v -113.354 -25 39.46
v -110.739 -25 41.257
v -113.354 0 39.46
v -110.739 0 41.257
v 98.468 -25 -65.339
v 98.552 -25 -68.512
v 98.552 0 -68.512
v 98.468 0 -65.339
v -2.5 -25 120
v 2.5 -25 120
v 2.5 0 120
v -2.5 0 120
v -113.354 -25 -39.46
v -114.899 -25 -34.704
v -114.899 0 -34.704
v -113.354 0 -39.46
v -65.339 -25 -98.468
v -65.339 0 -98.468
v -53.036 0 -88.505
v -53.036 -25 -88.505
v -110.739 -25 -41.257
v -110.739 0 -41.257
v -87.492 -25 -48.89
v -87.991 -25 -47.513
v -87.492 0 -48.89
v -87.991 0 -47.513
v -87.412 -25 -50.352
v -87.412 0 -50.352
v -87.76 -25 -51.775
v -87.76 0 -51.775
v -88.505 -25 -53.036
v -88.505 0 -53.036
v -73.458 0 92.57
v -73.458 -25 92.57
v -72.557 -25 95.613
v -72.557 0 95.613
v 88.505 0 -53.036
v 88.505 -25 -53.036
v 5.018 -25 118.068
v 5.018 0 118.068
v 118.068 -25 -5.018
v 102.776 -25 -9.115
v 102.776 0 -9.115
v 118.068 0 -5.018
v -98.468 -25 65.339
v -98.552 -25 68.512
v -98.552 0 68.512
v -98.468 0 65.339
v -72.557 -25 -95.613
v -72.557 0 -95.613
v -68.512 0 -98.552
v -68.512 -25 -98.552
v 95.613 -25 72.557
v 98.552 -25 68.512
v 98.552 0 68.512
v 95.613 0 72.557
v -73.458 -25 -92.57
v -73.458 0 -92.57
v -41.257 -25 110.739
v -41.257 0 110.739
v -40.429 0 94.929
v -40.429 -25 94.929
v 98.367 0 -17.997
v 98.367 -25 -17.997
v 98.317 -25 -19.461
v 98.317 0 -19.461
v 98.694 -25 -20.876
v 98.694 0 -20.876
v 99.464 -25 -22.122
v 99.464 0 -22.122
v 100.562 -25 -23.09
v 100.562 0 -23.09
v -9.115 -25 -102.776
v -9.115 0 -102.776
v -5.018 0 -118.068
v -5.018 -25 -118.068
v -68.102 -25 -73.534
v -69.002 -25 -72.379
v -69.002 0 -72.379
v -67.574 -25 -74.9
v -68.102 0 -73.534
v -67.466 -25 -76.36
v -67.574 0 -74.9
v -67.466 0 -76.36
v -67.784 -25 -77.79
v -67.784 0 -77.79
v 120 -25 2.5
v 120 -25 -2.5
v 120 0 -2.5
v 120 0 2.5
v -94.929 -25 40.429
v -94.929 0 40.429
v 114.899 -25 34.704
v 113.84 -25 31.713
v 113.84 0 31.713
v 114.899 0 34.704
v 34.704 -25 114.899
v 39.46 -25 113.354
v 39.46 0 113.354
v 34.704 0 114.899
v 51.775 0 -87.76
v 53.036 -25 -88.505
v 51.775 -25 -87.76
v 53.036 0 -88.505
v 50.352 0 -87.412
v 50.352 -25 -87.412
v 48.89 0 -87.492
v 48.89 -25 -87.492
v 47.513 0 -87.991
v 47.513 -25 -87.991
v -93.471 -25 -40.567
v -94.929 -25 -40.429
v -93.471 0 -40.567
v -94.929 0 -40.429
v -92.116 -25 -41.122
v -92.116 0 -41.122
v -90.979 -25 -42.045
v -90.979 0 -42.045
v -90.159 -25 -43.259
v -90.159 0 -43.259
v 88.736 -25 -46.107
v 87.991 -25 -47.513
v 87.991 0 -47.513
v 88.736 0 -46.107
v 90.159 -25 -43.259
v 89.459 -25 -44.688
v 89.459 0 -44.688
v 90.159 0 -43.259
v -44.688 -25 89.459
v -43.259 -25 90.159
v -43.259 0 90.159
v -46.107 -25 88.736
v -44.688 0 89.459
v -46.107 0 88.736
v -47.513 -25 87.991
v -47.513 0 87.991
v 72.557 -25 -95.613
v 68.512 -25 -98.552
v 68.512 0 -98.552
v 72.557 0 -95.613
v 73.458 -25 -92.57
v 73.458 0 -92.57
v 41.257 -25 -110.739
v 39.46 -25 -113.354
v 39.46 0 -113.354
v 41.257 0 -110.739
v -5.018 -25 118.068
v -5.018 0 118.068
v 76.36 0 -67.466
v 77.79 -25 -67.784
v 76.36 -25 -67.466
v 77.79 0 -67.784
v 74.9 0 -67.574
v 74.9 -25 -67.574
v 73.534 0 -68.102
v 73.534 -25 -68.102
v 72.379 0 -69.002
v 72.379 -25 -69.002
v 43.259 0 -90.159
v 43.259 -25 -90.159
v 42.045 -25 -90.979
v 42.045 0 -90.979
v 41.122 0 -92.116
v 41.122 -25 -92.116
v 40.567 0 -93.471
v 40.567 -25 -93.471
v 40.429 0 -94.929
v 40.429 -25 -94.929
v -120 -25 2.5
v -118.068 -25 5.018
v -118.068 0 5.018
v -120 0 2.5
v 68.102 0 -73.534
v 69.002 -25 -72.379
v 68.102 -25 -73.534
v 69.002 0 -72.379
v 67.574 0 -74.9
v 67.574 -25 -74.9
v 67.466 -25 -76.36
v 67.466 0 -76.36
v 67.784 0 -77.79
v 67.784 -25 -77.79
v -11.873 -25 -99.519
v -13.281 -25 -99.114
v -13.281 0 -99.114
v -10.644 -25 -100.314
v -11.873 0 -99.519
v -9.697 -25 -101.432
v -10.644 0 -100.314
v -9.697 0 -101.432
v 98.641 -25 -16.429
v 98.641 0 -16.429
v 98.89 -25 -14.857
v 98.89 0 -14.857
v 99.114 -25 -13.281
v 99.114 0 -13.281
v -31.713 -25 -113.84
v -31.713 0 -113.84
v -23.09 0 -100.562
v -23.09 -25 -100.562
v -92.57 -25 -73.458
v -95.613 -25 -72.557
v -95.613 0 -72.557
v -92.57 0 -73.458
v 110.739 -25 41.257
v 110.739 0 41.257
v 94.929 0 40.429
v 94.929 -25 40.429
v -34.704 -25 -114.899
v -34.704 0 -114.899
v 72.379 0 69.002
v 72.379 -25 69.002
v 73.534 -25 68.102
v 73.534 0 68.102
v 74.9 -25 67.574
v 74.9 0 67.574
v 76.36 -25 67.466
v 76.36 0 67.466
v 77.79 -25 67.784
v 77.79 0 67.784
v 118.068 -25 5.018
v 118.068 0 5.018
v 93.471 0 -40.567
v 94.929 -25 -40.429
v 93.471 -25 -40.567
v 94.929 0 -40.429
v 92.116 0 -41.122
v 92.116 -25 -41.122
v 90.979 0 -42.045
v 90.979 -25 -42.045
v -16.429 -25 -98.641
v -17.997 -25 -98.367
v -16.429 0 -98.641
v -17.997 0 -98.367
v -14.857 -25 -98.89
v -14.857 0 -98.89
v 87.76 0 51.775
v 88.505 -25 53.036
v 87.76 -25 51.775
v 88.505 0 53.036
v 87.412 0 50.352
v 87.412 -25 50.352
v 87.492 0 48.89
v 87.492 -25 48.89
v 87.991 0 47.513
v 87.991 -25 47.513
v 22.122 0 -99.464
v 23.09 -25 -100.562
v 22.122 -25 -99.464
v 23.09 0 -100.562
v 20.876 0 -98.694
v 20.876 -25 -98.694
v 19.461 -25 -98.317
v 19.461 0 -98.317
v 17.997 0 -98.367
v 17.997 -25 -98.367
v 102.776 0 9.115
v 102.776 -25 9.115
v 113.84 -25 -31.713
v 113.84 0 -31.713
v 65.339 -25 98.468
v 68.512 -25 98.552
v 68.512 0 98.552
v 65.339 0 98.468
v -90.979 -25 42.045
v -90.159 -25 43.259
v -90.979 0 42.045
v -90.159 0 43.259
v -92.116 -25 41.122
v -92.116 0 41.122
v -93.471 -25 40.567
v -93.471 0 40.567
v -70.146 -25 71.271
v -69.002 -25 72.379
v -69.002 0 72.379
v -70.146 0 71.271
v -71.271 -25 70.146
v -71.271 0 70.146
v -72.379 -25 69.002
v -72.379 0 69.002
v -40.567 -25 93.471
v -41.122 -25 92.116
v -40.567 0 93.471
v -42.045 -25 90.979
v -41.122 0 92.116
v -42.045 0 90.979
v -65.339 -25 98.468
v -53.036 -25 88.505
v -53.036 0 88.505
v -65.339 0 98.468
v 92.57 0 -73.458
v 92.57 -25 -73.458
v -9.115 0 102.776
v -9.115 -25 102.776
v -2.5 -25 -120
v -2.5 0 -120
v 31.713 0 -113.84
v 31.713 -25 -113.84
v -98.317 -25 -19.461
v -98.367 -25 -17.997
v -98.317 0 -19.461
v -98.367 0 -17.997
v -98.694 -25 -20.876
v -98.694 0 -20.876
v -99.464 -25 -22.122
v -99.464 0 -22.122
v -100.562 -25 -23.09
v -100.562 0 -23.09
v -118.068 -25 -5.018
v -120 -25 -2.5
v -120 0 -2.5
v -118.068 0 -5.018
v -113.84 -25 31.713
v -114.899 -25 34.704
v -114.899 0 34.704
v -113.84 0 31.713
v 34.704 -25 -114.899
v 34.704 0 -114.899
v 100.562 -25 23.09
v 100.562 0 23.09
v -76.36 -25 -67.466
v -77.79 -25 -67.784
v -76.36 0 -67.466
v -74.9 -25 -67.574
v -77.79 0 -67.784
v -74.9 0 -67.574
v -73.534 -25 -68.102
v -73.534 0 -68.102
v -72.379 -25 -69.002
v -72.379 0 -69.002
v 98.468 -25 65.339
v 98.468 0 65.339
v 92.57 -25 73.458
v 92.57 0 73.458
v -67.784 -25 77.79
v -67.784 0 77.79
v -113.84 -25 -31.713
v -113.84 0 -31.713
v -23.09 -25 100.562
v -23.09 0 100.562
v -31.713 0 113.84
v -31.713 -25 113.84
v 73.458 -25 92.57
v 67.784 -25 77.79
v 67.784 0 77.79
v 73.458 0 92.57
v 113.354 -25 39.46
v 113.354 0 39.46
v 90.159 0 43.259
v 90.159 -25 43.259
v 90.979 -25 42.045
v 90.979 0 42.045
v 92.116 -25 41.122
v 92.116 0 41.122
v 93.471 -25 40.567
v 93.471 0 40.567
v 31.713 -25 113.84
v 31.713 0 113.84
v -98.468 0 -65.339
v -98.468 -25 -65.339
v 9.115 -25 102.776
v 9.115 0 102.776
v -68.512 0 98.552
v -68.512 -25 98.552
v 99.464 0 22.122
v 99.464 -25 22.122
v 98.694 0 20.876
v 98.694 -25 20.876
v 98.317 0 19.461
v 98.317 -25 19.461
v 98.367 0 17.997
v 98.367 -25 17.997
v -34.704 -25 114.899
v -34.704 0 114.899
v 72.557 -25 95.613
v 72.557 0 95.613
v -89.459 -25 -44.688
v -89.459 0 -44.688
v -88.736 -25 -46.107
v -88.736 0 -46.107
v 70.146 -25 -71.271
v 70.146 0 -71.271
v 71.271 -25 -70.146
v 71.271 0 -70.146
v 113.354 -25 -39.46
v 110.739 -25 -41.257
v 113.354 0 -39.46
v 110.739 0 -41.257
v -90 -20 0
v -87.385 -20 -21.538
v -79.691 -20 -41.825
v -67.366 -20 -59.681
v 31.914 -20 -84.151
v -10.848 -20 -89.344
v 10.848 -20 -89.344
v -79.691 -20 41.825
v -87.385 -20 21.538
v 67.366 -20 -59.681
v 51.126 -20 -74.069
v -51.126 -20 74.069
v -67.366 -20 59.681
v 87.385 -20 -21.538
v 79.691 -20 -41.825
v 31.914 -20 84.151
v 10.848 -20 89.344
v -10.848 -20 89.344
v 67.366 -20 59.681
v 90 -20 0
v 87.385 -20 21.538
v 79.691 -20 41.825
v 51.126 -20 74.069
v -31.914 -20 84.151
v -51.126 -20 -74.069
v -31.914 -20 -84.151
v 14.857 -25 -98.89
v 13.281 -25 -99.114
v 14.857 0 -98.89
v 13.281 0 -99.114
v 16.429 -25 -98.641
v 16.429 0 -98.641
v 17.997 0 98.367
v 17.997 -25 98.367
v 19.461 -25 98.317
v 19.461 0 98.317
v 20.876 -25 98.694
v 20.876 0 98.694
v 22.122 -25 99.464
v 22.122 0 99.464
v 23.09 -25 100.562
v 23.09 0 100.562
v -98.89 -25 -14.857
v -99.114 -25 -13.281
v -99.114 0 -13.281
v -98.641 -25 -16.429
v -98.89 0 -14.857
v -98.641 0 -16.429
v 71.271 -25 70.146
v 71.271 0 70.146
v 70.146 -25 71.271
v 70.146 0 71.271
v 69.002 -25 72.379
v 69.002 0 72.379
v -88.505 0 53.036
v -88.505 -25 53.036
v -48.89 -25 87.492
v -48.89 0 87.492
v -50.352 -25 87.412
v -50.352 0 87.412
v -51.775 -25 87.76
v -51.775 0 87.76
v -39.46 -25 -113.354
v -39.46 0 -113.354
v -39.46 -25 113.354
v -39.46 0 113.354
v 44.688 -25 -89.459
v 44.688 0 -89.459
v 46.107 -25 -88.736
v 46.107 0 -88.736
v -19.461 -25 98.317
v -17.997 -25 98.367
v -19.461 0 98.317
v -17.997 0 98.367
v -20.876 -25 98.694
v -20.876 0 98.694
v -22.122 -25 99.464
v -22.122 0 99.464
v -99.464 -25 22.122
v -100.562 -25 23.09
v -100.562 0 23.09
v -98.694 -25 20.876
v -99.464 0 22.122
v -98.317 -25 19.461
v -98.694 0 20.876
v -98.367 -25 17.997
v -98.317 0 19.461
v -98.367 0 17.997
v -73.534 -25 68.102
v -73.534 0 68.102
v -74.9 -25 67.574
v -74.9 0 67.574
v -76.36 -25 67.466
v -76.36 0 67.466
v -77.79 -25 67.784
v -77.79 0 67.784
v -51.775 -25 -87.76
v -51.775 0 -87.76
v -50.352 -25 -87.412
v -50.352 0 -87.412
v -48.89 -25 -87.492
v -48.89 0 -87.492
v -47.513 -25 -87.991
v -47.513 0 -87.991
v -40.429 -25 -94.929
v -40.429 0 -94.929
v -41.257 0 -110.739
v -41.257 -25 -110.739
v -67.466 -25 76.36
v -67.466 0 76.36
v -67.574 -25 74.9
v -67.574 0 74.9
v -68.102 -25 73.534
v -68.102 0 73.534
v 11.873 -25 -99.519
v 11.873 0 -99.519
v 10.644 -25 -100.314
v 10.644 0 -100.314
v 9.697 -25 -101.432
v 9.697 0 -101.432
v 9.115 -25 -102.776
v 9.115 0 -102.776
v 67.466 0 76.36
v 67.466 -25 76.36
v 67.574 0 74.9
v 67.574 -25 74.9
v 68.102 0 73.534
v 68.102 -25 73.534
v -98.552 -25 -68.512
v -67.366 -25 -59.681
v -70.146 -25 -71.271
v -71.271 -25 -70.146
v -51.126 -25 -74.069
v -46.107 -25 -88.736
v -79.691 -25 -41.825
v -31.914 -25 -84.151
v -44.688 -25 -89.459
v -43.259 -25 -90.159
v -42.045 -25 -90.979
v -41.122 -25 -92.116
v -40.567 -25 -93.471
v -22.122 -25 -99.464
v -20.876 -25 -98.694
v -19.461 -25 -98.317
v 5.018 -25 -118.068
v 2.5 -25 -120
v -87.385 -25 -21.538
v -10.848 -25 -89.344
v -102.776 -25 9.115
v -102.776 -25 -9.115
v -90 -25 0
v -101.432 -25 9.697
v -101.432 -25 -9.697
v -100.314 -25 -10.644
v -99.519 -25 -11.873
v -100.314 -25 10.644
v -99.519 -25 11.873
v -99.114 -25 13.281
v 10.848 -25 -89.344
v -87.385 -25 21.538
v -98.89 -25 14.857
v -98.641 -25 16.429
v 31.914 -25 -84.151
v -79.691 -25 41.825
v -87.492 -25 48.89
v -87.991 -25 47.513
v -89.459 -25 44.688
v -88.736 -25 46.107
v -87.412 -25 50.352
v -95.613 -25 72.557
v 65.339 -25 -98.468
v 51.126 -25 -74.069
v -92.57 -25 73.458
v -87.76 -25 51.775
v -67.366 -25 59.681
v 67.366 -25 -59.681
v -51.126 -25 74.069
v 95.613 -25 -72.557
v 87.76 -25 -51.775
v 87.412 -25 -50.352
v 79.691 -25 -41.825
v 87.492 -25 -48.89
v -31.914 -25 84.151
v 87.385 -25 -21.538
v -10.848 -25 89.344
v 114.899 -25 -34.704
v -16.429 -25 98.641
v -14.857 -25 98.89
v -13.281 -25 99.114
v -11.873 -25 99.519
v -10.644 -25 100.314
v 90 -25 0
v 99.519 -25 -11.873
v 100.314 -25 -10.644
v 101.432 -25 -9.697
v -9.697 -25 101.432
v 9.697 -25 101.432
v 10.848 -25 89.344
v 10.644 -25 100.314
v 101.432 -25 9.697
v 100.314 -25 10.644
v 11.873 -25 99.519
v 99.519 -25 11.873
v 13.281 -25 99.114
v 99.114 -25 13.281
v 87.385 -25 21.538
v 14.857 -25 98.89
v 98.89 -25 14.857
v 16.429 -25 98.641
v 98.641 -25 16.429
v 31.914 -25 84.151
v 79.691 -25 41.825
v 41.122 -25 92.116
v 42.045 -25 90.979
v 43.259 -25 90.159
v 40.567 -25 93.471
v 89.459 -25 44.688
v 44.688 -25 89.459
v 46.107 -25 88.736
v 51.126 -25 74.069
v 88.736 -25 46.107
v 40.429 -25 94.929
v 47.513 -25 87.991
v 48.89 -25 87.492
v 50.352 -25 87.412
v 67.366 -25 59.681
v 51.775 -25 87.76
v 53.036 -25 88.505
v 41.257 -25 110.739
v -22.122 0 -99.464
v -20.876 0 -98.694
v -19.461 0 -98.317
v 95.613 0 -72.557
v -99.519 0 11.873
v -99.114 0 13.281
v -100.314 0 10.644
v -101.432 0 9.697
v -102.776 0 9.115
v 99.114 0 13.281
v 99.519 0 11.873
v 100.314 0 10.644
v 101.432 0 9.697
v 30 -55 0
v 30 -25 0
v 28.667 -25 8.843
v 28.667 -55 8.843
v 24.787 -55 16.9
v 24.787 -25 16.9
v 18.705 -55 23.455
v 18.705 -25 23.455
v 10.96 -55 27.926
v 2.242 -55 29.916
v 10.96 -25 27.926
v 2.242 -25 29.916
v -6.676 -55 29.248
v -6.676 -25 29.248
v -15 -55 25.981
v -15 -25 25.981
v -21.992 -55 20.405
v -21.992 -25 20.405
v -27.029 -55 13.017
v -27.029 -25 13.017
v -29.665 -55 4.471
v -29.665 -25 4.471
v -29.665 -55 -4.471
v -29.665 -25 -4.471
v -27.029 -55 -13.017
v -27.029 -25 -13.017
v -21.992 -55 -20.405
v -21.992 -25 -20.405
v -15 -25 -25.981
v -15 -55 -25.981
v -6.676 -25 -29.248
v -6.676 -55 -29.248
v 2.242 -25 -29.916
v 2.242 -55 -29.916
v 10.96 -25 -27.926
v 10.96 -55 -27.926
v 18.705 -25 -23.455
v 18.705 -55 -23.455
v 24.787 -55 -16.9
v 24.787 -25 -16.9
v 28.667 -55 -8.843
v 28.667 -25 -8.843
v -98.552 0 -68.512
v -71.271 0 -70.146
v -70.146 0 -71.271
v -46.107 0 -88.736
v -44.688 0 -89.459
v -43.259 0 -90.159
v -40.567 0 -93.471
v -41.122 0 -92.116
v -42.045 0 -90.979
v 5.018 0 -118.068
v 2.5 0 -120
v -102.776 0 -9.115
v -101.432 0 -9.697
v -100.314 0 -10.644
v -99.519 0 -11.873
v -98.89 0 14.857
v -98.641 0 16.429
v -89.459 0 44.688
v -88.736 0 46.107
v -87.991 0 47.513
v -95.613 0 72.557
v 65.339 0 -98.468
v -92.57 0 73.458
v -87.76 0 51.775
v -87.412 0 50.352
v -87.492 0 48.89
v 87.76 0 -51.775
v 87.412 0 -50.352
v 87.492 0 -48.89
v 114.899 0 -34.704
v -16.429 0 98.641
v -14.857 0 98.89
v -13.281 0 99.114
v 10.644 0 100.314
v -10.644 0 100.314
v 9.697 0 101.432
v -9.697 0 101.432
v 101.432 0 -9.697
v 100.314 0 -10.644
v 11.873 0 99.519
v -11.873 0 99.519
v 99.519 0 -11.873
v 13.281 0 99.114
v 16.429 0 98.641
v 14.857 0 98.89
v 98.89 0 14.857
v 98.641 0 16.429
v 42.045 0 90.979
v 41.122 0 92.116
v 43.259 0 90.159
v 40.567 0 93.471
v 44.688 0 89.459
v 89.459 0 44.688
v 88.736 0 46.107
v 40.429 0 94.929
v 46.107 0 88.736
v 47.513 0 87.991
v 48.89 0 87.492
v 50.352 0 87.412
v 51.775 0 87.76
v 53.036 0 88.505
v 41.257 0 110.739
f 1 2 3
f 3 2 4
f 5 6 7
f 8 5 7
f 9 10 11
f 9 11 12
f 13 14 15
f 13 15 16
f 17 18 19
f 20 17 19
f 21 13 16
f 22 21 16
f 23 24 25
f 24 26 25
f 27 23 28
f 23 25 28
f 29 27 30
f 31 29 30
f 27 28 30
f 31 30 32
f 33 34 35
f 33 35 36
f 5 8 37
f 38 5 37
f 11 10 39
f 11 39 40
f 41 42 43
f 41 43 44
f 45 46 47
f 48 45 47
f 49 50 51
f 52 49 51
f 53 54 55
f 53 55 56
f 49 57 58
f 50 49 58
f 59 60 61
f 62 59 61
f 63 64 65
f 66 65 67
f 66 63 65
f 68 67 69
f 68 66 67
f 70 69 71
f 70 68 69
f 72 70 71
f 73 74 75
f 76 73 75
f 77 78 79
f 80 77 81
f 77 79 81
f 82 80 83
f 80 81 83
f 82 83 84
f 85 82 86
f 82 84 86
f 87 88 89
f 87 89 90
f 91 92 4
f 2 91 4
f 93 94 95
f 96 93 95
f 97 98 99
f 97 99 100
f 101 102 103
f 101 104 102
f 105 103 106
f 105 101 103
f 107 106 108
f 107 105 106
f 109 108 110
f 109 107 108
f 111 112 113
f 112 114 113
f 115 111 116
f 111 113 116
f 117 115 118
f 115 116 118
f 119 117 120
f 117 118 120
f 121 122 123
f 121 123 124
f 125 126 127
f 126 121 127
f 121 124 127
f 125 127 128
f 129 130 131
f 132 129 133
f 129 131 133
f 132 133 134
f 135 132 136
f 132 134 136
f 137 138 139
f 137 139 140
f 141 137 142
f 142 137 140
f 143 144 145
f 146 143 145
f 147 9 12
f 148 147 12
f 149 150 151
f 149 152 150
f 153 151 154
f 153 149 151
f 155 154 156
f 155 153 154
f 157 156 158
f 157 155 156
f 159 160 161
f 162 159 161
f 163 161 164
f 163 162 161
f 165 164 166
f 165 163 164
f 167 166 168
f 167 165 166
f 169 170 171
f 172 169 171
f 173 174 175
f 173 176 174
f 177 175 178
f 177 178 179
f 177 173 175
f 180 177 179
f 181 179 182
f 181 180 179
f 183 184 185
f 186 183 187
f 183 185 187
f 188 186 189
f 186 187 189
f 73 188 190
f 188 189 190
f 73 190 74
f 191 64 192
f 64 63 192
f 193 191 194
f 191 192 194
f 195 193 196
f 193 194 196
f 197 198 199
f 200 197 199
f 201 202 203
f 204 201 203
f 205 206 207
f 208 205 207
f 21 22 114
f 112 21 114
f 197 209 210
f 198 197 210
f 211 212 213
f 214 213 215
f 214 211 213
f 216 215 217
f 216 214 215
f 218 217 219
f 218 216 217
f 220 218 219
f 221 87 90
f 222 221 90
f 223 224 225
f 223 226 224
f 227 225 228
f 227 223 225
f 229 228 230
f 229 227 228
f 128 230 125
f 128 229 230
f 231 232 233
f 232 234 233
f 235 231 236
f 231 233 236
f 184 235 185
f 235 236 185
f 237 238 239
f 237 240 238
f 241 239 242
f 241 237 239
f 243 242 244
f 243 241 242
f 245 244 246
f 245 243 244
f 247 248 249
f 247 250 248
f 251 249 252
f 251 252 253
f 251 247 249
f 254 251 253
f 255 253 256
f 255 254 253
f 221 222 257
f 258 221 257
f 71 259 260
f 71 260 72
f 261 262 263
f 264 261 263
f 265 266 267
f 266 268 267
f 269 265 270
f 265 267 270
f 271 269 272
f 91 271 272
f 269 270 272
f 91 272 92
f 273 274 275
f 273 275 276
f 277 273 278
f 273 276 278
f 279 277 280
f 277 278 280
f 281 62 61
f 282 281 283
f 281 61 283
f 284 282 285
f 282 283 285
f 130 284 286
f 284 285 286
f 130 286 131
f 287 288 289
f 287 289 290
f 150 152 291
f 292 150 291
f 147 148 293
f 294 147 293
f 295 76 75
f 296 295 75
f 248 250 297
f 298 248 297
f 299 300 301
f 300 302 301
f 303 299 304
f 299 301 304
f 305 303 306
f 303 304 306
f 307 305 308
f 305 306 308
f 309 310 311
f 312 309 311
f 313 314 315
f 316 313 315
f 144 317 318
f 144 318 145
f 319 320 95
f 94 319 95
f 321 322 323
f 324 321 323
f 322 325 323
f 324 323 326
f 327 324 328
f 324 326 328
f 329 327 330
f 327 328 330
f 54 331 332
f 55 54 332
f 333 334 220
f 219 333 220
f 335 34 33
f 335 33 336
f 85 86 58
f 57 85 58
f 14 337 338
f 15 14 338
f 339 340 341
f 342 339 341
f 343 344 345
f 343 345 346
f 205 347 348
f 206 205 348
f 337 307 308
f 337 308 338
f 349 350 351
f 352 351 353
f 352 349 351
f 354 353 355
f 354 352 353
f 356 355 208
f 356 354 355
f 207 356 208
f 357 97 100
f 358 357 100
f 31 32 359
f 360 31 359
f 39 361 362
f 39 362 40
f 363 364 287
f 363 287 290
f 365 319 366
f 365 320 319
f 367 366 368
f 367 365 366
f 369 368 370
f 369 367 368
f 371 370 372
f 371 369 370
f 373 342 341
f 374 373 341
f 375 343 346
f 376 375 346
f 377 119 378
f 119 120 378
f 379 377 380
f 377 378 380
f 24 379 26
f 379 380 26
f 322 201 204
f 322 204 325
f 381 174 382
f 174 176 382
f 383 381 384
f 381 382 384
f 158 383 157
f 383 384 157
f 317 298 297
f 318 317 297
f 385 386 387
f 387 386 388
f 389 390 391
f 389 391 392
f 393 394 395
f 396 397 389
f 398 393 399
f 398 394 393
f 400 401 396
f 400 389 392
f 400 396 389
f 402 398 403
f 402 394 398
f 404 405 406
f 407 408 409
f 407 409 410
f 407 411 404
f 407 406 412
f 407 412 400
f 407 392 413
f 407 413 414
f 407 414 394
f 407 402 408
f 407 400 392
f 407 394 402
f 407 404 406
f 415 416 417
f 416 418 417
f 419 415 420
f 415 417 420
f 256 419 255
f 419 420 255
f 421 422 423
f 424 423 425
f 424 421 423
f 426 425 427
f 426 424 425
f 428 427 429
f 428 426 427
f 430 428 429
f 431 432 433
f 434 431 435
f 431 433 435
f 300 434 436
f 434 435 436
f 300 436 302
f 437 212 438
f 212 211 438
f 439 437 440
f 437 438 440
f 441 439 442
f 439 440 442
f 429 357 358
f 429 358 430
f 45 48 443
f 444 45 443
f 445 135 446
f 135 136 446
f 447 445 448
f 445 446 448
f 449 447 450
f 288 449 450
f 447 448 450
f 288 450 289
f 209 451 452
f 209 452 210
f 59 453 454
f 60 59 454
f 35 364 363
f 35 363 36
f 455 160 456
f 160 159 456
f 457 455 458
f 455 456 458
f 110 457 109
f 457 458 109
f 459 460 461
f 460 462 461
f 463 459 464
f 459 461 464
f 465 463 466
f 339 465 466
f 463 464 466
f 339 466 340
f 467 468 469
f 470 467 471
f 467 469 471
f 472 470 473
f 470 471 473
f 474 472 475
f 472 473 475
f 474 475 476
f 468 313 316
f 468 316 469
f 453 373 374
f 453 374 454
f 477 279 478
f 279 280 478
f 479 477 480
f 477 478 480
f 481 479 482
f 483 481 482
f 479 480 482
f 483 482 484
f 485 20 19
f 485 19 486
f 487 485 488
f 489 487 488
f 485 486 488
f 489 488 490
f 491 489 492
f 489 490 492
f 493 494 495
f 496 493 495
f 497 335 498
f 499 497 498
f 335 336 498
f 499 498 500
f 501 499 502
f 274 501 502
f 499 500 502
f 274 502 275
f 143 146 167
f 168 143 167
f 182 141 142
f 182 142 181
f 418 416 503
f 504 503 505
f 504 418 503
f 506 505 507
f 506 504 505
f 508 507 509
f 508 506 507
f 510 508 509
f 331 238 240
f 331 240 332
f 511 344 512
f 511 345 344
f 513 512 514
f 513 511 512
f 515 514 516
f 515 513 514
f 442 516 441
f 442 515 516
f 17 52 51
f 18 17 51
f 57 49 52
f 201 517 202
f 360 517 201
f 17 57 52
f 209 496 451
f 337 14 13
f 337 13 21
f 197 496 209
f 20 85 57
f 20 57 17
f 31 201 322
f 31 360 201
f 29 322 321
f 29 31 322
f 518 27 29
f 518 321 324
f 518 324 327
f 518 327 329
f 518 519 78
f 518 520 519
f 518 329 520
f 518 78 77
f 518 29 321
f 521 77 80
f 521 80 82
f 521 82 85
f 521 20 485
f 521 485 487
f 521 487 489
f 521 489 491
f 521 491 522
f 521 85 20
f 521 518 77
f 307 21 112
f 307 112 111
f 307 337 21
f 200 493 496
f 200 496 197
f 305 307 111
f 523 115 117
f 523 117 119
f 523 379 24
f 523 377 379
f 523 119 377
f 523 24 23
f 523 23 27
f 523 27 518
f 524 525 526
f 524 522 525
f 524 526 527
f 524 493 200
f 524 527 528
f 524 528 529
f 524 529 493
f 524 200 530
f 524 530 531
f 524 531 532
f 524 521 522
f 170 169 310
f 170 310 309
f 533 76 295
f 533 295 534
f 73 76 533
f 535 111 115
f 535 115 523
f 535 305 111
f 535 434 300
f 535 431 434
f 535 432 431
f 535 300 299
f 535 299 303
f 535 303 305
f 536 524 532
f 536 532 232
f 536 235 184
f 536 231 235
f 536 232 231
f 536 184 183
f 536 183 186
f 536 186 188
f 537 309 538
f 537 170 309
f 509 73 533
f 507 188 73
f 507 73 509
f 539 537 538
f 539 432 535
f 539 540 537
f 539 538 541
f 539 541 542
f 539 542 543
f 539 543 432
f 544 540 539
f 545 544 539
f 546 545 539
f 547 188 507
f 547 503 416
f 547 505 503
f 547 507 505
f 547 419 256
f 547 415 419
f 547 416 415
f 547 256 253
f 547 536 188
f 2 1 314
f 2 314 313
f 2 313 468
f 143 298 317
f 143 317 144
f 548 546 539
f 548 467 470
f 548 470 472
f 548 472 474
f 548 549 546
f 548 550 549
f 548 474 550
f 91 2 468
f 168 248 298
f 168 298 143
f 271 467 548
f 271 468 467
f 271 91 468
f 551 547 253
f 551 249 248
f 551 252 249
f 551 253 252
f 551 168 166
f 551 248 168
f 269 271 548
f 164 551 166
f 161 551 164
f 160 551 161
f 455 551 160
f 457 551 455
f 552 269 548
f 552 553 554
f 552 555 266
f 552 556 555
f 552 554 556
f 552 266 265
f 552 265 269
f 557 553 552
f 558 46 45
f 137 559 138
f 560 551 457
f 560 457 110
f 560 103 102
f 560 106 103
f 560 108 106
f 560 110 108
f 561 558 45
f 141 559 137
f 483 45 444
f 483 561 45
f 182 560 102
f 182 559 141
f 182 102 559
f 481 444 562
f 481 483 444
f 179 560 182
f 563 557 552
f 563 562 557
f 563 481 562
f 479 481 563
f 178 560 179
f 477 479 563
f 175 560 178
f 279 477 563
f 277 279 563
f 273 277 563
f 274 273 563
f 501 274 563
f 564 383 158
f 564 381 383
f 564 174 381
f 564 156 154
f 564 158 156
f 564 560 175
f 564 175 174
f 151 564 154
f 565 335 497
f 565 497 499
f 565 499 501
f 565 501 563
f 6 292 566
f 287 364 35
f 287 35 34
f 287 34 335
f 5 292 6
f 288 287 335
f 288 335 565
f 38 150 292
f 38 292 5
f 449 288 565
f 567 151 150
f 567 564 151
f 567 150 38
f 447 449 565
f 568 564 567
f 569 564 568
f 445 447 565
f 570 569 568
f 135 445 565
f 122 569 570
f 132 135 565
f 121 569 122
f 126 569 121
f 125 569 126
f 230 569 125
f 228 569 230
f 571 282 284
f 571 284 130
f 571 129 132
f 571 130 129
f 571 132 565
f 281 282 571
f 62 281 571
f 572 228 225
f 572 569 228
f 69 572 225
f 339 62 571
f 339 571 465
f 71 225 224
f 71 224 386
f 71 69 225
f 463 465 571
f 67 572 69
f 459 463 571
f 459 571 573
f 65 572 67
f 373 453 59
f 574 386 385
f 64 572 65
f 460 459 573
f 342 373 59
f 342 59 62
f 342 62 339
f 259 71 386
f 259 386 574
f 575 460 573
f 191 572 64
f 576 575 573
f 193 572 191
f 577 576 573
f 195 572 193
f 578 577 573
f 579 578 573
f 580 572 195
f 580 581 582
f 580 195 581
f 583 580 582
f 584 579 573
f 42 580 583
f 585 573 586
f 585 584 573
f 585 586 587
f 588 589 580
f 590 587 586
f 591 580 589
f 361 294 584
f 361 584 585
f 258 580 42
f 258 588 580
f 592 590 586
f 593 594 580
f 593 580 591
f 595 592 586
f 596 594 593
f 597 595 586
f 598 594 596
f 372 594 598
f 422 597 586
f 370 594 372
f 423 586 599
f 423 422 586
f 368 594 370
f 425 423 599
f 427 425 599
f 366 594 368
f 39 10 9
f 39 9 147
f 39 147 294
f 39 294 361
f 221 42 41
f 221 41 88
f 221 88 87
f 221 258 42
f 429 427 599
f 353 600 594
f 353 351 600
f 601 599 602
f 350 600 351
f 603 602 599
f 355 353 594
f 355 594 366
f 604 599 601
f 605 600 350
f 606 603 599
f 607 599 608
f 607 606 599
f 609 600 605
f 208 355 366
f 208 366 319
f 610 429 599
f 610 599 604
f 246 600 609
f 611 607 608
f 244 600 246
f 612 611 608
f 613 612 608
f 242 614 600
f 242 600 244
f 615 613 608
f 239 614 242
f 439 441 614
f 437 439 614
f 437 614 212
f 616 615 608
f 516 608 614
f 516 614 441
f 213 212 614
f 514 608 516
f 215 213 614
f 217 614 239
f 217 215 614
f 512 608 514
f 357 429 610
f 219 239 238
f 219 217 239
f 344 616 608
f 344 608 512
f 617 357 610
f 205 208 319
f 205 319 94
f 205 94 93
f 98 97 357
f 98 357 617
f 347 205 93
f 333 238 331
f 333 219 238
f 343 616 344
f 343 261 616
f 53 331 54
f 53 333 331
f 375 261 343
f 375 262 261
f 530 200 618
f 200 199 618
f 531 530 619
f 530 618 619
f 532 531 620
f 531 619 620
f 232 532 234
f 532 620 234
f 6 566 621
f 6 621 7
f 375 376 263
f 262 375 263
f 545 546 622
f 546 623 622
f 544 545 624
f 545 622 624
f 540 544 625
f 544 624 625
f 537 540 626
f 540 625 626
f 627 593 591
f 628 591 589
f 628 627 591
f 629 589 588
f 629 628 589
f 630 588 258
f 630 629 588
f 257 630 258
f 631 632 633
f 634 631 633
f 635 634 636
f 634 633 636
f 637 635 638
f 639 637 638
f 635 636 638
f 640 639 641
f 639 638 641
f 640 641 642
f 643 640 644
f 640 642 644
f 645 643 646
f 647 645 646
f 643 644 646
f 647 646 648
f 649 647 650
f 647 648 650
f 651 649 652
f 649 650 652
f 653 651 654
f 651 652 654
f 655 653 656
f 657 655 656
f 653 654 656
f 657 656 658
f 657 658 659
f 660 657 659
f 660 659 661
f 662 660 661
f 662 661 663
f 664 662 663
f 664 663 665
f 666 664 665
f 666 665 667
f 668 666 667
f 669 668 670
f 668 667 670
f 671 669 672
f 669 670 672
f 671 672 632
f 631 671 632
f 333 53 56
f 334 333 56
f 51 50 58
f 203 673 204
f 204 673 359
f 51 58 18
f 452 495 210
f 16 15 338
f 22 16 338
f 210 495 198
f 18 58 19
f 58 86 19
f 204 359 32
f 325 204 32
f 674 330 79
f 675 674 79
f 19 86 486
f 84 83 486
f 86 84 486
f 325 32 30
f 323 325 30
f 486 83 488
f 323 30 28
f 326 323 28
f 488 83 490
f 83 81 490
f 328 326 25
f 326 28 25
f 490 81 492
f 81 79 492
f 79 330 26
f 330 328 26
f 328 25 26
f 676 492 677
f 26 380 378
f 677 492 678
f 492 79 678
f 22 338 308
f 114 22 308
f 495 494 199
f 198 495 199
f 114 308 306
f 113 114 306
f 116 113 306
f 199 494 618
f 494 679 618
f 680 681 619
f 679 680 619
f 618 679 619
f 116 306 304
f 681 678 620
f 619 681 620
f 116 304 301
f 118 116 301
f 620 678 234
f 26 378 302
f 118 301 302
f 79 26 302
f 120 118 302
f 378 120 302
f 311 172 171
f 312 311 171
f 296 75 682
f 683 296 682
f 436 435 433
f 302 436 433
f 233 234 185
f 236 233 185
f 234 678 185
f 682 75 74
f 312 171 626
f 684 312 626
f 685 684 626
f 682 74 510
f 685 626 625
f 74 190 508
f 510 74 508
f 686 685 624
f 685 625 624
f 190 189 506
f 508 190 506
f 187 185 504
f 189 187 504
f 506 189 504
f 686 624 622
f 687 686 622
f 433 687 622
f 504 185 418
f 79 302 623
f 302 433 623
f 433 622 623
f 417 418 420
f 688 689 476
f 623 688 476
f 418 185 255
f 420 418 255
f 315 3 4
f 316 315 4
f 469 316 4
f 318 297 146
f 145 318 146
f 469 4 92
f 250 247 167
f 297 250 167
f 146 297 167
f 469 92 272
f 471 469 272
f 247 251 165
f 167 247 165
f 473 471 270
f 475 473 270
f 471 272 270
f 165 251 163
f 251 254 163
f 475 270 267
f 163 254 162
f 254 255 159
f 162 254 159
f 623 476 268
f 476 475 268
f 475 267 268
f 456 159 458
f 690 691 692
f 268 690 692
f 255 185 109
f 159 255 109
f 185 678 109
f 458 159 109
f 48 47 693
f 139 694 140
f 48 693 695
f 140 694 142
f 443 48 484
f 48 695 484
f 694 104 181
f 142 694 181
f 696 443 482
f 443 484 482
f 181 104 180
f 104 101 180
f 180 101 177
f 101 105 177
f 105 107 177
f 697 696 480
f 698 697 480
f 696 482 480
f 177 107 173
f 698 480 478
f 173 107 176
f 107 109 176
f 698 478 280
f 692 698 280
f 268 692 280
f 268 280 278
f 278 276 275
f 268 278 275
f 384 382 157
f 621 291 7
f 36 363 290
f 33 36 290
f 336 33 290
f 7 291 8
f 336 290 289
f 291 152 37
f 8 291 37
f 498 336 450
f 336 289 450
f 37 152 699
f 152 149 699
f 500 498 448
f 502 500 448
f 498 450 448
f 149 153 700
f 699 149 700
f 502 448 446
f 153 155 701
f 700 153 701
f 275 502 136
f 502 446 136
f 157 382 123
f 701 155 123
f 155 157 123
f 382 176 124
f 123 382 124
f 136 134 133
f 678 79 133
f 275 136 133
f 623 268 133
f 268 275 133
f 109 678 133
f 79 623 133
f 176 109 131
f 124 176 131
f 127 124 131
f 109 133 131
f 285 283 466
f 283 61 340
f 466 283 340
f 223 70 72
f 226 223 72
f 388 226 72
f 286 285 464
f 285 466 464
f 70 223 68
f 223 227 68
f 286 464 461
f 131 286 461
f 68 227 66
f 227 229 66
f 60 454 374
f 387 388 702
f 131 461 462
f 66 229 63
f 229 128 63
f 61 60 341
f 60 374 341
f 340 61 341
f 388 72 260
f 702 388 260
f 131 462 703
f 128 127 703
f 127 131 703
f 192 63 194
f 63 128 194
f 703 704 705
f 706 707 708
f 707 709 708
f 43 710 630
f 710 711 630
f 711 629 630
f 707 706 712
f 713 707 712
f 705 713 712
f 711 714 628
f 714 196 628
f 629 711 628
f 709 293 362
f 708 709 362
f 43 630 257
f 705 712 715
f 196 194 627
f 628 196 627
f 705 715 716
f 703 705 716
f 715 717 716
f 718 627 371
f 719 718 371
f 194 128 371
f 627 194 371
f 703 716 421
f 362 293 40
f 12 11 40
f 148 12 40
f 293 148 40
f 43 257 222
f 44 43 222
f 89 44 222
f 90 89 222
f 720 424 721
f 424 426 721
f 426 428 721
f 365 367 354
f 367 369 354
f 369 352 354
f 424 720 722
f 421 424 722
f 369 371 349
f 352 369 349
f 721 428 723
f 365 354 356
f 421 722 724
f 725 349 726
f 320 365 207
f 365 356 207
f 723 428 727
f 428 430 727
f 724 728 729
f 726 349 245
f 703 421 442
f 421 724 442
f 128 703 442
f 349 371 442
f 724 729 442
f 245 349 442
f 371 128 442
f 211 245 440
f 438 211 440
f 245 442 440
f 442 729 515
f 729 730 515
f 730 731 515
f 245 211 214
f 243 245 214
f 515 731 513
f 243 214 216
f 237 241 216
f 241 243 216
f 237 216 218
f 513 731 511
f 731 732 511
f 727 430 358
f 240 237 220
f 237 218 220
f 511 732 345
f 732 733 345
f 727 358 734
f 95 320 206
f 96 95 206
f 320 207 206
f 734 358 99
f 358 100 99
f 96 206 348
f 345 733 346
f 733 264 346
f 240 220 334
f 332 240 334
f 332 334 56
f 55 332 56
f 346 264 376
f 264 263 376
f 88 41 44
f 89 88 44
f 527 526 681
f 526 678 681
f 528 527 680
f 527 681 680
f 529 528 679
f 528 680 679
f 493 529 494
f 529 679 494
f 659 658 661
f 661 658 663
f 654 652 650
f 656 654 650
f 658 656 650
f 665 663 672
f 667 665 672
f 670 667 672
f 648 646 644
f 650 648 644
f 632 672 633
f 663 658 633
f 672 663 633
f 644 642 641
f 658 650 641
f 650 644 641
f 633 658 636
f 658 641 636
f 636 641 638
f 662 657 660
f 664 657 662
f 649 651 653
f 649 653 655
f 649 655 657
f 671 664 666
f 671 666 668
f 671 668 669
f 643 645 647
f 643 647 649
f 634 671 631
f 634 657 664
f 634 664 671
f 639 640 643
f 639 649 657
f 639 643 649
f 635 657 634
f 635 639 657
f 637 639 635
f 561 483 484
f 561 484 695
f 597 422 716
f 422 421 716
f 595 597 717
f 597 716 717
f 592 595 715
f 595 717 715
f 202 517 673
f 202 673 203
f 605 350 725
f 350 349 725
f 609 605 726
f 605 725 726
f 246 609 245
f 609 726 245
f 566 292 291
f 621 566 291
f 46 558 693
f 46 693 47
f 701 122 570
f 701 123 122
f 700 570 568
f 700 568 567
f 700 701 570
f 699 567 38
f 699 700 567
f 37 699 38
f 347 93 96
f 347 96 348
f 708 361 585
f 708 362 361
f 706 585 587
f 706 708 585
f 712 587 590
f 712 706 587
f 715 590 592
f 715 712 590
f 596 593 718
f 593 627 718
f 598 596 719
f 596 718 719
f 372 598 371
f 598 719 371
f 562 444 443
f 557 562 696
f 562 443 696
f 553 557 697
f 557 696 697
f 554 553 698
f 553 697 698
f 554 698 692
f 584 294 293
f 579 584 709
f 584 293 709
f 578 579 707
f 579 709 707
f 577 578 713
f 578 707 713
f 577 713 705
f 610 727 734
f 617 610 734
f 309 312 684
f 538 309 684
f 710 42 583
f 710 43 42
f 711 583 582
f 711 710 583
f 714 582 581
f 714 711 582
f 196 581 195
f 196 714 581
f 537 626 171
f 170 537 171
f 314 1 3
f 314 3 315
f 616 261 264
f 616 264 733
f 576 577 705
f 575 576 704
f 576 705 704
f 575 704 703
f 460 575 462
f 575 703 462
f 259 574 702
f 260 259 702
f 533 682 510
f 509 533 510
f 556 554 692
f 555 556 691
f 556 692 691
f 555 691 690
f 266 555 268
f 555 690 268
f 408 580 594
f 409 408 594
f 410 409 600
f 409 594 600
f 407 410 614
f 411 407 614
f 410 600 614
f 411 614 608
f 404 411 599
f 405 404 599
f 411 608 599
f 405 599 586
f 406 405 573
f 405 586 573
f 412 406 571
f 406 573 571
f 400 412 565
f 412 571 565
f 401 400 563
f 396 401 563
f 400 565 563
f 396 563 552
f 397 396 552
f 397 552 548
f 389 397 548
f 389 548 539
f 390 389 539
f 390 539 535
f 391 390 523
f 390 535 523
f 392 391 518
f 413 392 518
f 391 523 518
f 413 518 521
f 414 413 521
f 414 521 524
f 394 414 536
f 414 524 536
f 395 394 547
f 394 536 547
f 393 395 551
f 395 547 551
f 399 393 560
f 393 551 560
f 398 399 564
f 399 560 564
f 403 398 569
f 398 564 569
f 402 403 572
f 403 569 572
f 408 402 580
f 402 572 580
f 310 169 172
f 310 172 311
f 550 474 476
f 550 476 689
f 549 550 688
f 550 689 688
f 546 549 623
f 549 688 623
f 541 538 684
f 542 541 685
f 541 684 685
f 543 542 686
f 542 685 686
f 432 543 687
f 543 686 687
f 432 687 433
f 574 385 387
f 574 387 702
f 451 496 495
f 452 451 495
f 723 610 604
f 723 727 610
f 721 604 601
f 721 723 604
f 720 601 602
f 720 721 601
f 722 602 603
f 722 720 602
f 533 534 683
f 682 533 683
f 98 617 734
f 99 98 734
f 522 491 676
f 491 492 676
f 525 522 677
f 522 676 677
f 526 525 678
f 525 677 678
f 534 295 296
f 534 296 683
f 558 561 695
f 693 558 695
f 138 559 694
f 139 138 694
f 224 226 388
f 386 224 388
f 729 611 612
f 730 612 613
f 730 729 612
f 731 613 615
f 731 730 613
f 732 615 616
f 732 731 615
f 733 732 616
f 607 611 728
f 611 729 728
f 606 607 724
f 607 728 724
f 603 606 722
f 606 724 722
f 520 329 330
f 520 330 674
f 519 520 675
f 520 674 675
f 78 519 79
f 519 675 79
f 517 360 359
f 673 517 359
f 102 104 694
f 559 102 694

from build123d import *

# Parameters (mm, degrees)
F0_R            = 100
F1_DEPTH        = 25
F3_DEPTH        = 25
F3_COPIES_COUNT = 20
F4_SIZE         = 2
F5_R            = 5
F6_R            = 90
F7_DEPTH        = 5
F8_R            = 30
F9_DEPTH        = 30


# Not quite as in the source:
# - a pattern or mirror of a feature is missing from the dataset's text; its kind, count and spacing are read off the source's solid


with BuildPart() as f1:
    # F0 (on Front) → F1 (new body)
    with BuildSketch(Plane.XZ):
        Circle(F0_R)
    extrude(amount=F1_DEPTH)

    # F2 (on face) → F3 (join)
    with BuildSketch(Plane.XZ.offset(25)):
        with BuildLine():
            Line((9.9931095726, 99.4994359837), (-9.9931095726, 99.4994359837))
            ThreePointArc((-9.9931095726, 99.4994359837), (-67.0846071865, -74.159662072), (100, 0))
            ThreePointArc((100, 0), (74.159662072, 67.0846071865), (9.9931095726, 99.4994359837))
        make_face()
        with BuildLine():
            Line((-4.5, 120), (-9.9931095726, 99.4994359837))
            ThreePointArc((-9.9931095726, 99.4994359837), (0, 100), (9.9931095726, 99.4994359837))
            Line((9.9931095726, 99.4994359837), (4.5, 120))
            Line((4.5, 120), (-4.5, 120))
        make_face()
    f3 = extrude(amount=-F3_DEPTH)

    # F3_copies: F3 ×20 about axis
    f3_copies_axis = Axis((0, 0, 0), (0, 1, 0))
    for i in range(1, F3_COPIES_COUNT):
        add(f3.rotate(f3_copies_axis, i * 360 / F3_COPIES_COUNT))

    # F4
    f4_edges = [f1.edges().sort_by_distance(p)[0] for p in [
        (-4.5, -12.5, 120),
        (4.5, -12.5, 120),
        (-41.361794, -12.5, 112.736205),
        (-66.893654, -12.5, 99.727073),
        (-32.802285, -12.5, 115.517358),
        (-74.174807, -12.5, 94.437006),
        (32.802285, -12.5, 115.517358),
        (41.361794, -12.5, 112.736205),
        (66.893654, -12.5, 99.727073),
        (74.174807, -12.5, 94.437006),
        (94.437006, -12.5, 74.174807),
        (99.727073, -12.5, 66.893654),
        (112.736205, -12.5, 41.361794),
        (115.517358, -12.5, 32.802285),
        (120, -12.5, 4.5),
        (120, -12.5, -4.5),
        (115.517358, -12.5, -32.802285),
        (112.736205, -12.5, -41.361794),
        (99.727073, -12.5, -66.893654),
        (94.437006, -12.5, -74.174807),
        (74.174807, -12.5, -94.437006),
        (66.893654, -12.5, -99.727073),
        (41.361794, -12.5, -112.736205),
        (32.802285, -12.5, -115.517358),
        (4.5, -12.5, -120),
        (-4.5, -12.5, -120),
        (-32.802285, -12.5, -115.517358),
        (-41.361794, -12.5, -112.736205),
        (-66.893654, -12.5, -99.727073),
        (-74.174807, -12.5, -94.437006),
        (-94.437006, -12.5, -74.174807),
        (-99.727073, -12.5, -66.893654),
        (-112.736205, -12.5, -41.361794),
        (-115.517358, -12.5, -32.802285),
        (-120, -12.5, -4.5),
        (-120, -12.5, 4.5),
        (-115.517358, -12.5, 32.802285),
        (-112.736205, -12.5, 41.361794),
        (-99.727073, -12.5, 66.893654),
        (-94.437006, -12.5, 74.174807),
    ]]
    chamfer(f4_edges, length=F4_SIZE)

    # F5
    f5_edges = [f1.edges().sort_by_distance(p)[0] for p in [
        (9.99311, -12.5, 99.499436),
        (-9.99311, -12.5, 99.499436),
        (21.243005, -12.5, 97.717628),
        (-21.243005, -12.5, 97.717628),
        (40.251029, -12.5, 91.541546),
        (50.399706, -12.5, 86.370537),
        (-40.251029, -12.5, 91.541546),
        (-50.399706, -12.5, 86.370537),
        (66.568897, -12.5, 74.622932),
        (74.622932, -12.5, 66.568897),
        (-66.568897, -12.5, 74.622932),
        (-74.622932, -12.5, 66.568897),
        (86.370537, -12.5, 50.399706),
        (91.541546, -12.5, 40.251029),
        (-86.370537, -12.5, 50.399706),
        (-91.541546, -12.5, 40.251029),
        (97.717628, -12.5, 21.243005),
        (99.499436, -12.5, 9.99311),
        (-97.717628, -12.5, 21.243005),
        (-99.499436, -12.5, 9.99311),
        (99.499436, -12.5, -9.99311),
        (97.717628, -12.5, -21.243005),
        (-99.499436, -12.5, -9.99311),
        (-97.717628, -12.5, -21.243005),
        (91.541546, -12.5, -40.251029),
        (86.370537, -12.5, -50.399706),
        (-91.541546, -12.5, -40.251029),
        (-86.370537, -12.5, -50.399706),
        (74.622932, -12.5, -66.568897),
        (66.568897, -12.5, -74.622932),
        (-74.622932, -12.5, -66.568897),
        (-66.568897, -12.5, -74.622932),
        (50.399706, -12.5, -86.370537),
        (40.251029, -12.5, -91.541546),
        (-50.399706, -12.5, -86.370537),
        (-40.251029, -12.5, -91.541546),
        (21.243005, -12.5, -97.717628),
        (9.99311, -12.5, -99.499436),
        (-21.243005, -12.5, -97.717628),
        (-9.99311, -12.5, -99.499436),
    ]]
    fillet(f5_edges, radius=F5_R)

    # F6 (on face) → F7 (cut)
    with BuildSketch(Plane.XZ.offset(25)):
        Circle(F6_R)
    extrude(amount=-F7_DEPTH, mode=Mode.SUBTRACT)


with BuildPart() as f9:
    # F8 (on face) → F9 (new body)
    with BuildSketch(Plane.XZ.offset(25)):
        Circle(F8_R)
    extrude(amount=F9_DEPTH)


solid = Compound([f1.part, f9.part])
